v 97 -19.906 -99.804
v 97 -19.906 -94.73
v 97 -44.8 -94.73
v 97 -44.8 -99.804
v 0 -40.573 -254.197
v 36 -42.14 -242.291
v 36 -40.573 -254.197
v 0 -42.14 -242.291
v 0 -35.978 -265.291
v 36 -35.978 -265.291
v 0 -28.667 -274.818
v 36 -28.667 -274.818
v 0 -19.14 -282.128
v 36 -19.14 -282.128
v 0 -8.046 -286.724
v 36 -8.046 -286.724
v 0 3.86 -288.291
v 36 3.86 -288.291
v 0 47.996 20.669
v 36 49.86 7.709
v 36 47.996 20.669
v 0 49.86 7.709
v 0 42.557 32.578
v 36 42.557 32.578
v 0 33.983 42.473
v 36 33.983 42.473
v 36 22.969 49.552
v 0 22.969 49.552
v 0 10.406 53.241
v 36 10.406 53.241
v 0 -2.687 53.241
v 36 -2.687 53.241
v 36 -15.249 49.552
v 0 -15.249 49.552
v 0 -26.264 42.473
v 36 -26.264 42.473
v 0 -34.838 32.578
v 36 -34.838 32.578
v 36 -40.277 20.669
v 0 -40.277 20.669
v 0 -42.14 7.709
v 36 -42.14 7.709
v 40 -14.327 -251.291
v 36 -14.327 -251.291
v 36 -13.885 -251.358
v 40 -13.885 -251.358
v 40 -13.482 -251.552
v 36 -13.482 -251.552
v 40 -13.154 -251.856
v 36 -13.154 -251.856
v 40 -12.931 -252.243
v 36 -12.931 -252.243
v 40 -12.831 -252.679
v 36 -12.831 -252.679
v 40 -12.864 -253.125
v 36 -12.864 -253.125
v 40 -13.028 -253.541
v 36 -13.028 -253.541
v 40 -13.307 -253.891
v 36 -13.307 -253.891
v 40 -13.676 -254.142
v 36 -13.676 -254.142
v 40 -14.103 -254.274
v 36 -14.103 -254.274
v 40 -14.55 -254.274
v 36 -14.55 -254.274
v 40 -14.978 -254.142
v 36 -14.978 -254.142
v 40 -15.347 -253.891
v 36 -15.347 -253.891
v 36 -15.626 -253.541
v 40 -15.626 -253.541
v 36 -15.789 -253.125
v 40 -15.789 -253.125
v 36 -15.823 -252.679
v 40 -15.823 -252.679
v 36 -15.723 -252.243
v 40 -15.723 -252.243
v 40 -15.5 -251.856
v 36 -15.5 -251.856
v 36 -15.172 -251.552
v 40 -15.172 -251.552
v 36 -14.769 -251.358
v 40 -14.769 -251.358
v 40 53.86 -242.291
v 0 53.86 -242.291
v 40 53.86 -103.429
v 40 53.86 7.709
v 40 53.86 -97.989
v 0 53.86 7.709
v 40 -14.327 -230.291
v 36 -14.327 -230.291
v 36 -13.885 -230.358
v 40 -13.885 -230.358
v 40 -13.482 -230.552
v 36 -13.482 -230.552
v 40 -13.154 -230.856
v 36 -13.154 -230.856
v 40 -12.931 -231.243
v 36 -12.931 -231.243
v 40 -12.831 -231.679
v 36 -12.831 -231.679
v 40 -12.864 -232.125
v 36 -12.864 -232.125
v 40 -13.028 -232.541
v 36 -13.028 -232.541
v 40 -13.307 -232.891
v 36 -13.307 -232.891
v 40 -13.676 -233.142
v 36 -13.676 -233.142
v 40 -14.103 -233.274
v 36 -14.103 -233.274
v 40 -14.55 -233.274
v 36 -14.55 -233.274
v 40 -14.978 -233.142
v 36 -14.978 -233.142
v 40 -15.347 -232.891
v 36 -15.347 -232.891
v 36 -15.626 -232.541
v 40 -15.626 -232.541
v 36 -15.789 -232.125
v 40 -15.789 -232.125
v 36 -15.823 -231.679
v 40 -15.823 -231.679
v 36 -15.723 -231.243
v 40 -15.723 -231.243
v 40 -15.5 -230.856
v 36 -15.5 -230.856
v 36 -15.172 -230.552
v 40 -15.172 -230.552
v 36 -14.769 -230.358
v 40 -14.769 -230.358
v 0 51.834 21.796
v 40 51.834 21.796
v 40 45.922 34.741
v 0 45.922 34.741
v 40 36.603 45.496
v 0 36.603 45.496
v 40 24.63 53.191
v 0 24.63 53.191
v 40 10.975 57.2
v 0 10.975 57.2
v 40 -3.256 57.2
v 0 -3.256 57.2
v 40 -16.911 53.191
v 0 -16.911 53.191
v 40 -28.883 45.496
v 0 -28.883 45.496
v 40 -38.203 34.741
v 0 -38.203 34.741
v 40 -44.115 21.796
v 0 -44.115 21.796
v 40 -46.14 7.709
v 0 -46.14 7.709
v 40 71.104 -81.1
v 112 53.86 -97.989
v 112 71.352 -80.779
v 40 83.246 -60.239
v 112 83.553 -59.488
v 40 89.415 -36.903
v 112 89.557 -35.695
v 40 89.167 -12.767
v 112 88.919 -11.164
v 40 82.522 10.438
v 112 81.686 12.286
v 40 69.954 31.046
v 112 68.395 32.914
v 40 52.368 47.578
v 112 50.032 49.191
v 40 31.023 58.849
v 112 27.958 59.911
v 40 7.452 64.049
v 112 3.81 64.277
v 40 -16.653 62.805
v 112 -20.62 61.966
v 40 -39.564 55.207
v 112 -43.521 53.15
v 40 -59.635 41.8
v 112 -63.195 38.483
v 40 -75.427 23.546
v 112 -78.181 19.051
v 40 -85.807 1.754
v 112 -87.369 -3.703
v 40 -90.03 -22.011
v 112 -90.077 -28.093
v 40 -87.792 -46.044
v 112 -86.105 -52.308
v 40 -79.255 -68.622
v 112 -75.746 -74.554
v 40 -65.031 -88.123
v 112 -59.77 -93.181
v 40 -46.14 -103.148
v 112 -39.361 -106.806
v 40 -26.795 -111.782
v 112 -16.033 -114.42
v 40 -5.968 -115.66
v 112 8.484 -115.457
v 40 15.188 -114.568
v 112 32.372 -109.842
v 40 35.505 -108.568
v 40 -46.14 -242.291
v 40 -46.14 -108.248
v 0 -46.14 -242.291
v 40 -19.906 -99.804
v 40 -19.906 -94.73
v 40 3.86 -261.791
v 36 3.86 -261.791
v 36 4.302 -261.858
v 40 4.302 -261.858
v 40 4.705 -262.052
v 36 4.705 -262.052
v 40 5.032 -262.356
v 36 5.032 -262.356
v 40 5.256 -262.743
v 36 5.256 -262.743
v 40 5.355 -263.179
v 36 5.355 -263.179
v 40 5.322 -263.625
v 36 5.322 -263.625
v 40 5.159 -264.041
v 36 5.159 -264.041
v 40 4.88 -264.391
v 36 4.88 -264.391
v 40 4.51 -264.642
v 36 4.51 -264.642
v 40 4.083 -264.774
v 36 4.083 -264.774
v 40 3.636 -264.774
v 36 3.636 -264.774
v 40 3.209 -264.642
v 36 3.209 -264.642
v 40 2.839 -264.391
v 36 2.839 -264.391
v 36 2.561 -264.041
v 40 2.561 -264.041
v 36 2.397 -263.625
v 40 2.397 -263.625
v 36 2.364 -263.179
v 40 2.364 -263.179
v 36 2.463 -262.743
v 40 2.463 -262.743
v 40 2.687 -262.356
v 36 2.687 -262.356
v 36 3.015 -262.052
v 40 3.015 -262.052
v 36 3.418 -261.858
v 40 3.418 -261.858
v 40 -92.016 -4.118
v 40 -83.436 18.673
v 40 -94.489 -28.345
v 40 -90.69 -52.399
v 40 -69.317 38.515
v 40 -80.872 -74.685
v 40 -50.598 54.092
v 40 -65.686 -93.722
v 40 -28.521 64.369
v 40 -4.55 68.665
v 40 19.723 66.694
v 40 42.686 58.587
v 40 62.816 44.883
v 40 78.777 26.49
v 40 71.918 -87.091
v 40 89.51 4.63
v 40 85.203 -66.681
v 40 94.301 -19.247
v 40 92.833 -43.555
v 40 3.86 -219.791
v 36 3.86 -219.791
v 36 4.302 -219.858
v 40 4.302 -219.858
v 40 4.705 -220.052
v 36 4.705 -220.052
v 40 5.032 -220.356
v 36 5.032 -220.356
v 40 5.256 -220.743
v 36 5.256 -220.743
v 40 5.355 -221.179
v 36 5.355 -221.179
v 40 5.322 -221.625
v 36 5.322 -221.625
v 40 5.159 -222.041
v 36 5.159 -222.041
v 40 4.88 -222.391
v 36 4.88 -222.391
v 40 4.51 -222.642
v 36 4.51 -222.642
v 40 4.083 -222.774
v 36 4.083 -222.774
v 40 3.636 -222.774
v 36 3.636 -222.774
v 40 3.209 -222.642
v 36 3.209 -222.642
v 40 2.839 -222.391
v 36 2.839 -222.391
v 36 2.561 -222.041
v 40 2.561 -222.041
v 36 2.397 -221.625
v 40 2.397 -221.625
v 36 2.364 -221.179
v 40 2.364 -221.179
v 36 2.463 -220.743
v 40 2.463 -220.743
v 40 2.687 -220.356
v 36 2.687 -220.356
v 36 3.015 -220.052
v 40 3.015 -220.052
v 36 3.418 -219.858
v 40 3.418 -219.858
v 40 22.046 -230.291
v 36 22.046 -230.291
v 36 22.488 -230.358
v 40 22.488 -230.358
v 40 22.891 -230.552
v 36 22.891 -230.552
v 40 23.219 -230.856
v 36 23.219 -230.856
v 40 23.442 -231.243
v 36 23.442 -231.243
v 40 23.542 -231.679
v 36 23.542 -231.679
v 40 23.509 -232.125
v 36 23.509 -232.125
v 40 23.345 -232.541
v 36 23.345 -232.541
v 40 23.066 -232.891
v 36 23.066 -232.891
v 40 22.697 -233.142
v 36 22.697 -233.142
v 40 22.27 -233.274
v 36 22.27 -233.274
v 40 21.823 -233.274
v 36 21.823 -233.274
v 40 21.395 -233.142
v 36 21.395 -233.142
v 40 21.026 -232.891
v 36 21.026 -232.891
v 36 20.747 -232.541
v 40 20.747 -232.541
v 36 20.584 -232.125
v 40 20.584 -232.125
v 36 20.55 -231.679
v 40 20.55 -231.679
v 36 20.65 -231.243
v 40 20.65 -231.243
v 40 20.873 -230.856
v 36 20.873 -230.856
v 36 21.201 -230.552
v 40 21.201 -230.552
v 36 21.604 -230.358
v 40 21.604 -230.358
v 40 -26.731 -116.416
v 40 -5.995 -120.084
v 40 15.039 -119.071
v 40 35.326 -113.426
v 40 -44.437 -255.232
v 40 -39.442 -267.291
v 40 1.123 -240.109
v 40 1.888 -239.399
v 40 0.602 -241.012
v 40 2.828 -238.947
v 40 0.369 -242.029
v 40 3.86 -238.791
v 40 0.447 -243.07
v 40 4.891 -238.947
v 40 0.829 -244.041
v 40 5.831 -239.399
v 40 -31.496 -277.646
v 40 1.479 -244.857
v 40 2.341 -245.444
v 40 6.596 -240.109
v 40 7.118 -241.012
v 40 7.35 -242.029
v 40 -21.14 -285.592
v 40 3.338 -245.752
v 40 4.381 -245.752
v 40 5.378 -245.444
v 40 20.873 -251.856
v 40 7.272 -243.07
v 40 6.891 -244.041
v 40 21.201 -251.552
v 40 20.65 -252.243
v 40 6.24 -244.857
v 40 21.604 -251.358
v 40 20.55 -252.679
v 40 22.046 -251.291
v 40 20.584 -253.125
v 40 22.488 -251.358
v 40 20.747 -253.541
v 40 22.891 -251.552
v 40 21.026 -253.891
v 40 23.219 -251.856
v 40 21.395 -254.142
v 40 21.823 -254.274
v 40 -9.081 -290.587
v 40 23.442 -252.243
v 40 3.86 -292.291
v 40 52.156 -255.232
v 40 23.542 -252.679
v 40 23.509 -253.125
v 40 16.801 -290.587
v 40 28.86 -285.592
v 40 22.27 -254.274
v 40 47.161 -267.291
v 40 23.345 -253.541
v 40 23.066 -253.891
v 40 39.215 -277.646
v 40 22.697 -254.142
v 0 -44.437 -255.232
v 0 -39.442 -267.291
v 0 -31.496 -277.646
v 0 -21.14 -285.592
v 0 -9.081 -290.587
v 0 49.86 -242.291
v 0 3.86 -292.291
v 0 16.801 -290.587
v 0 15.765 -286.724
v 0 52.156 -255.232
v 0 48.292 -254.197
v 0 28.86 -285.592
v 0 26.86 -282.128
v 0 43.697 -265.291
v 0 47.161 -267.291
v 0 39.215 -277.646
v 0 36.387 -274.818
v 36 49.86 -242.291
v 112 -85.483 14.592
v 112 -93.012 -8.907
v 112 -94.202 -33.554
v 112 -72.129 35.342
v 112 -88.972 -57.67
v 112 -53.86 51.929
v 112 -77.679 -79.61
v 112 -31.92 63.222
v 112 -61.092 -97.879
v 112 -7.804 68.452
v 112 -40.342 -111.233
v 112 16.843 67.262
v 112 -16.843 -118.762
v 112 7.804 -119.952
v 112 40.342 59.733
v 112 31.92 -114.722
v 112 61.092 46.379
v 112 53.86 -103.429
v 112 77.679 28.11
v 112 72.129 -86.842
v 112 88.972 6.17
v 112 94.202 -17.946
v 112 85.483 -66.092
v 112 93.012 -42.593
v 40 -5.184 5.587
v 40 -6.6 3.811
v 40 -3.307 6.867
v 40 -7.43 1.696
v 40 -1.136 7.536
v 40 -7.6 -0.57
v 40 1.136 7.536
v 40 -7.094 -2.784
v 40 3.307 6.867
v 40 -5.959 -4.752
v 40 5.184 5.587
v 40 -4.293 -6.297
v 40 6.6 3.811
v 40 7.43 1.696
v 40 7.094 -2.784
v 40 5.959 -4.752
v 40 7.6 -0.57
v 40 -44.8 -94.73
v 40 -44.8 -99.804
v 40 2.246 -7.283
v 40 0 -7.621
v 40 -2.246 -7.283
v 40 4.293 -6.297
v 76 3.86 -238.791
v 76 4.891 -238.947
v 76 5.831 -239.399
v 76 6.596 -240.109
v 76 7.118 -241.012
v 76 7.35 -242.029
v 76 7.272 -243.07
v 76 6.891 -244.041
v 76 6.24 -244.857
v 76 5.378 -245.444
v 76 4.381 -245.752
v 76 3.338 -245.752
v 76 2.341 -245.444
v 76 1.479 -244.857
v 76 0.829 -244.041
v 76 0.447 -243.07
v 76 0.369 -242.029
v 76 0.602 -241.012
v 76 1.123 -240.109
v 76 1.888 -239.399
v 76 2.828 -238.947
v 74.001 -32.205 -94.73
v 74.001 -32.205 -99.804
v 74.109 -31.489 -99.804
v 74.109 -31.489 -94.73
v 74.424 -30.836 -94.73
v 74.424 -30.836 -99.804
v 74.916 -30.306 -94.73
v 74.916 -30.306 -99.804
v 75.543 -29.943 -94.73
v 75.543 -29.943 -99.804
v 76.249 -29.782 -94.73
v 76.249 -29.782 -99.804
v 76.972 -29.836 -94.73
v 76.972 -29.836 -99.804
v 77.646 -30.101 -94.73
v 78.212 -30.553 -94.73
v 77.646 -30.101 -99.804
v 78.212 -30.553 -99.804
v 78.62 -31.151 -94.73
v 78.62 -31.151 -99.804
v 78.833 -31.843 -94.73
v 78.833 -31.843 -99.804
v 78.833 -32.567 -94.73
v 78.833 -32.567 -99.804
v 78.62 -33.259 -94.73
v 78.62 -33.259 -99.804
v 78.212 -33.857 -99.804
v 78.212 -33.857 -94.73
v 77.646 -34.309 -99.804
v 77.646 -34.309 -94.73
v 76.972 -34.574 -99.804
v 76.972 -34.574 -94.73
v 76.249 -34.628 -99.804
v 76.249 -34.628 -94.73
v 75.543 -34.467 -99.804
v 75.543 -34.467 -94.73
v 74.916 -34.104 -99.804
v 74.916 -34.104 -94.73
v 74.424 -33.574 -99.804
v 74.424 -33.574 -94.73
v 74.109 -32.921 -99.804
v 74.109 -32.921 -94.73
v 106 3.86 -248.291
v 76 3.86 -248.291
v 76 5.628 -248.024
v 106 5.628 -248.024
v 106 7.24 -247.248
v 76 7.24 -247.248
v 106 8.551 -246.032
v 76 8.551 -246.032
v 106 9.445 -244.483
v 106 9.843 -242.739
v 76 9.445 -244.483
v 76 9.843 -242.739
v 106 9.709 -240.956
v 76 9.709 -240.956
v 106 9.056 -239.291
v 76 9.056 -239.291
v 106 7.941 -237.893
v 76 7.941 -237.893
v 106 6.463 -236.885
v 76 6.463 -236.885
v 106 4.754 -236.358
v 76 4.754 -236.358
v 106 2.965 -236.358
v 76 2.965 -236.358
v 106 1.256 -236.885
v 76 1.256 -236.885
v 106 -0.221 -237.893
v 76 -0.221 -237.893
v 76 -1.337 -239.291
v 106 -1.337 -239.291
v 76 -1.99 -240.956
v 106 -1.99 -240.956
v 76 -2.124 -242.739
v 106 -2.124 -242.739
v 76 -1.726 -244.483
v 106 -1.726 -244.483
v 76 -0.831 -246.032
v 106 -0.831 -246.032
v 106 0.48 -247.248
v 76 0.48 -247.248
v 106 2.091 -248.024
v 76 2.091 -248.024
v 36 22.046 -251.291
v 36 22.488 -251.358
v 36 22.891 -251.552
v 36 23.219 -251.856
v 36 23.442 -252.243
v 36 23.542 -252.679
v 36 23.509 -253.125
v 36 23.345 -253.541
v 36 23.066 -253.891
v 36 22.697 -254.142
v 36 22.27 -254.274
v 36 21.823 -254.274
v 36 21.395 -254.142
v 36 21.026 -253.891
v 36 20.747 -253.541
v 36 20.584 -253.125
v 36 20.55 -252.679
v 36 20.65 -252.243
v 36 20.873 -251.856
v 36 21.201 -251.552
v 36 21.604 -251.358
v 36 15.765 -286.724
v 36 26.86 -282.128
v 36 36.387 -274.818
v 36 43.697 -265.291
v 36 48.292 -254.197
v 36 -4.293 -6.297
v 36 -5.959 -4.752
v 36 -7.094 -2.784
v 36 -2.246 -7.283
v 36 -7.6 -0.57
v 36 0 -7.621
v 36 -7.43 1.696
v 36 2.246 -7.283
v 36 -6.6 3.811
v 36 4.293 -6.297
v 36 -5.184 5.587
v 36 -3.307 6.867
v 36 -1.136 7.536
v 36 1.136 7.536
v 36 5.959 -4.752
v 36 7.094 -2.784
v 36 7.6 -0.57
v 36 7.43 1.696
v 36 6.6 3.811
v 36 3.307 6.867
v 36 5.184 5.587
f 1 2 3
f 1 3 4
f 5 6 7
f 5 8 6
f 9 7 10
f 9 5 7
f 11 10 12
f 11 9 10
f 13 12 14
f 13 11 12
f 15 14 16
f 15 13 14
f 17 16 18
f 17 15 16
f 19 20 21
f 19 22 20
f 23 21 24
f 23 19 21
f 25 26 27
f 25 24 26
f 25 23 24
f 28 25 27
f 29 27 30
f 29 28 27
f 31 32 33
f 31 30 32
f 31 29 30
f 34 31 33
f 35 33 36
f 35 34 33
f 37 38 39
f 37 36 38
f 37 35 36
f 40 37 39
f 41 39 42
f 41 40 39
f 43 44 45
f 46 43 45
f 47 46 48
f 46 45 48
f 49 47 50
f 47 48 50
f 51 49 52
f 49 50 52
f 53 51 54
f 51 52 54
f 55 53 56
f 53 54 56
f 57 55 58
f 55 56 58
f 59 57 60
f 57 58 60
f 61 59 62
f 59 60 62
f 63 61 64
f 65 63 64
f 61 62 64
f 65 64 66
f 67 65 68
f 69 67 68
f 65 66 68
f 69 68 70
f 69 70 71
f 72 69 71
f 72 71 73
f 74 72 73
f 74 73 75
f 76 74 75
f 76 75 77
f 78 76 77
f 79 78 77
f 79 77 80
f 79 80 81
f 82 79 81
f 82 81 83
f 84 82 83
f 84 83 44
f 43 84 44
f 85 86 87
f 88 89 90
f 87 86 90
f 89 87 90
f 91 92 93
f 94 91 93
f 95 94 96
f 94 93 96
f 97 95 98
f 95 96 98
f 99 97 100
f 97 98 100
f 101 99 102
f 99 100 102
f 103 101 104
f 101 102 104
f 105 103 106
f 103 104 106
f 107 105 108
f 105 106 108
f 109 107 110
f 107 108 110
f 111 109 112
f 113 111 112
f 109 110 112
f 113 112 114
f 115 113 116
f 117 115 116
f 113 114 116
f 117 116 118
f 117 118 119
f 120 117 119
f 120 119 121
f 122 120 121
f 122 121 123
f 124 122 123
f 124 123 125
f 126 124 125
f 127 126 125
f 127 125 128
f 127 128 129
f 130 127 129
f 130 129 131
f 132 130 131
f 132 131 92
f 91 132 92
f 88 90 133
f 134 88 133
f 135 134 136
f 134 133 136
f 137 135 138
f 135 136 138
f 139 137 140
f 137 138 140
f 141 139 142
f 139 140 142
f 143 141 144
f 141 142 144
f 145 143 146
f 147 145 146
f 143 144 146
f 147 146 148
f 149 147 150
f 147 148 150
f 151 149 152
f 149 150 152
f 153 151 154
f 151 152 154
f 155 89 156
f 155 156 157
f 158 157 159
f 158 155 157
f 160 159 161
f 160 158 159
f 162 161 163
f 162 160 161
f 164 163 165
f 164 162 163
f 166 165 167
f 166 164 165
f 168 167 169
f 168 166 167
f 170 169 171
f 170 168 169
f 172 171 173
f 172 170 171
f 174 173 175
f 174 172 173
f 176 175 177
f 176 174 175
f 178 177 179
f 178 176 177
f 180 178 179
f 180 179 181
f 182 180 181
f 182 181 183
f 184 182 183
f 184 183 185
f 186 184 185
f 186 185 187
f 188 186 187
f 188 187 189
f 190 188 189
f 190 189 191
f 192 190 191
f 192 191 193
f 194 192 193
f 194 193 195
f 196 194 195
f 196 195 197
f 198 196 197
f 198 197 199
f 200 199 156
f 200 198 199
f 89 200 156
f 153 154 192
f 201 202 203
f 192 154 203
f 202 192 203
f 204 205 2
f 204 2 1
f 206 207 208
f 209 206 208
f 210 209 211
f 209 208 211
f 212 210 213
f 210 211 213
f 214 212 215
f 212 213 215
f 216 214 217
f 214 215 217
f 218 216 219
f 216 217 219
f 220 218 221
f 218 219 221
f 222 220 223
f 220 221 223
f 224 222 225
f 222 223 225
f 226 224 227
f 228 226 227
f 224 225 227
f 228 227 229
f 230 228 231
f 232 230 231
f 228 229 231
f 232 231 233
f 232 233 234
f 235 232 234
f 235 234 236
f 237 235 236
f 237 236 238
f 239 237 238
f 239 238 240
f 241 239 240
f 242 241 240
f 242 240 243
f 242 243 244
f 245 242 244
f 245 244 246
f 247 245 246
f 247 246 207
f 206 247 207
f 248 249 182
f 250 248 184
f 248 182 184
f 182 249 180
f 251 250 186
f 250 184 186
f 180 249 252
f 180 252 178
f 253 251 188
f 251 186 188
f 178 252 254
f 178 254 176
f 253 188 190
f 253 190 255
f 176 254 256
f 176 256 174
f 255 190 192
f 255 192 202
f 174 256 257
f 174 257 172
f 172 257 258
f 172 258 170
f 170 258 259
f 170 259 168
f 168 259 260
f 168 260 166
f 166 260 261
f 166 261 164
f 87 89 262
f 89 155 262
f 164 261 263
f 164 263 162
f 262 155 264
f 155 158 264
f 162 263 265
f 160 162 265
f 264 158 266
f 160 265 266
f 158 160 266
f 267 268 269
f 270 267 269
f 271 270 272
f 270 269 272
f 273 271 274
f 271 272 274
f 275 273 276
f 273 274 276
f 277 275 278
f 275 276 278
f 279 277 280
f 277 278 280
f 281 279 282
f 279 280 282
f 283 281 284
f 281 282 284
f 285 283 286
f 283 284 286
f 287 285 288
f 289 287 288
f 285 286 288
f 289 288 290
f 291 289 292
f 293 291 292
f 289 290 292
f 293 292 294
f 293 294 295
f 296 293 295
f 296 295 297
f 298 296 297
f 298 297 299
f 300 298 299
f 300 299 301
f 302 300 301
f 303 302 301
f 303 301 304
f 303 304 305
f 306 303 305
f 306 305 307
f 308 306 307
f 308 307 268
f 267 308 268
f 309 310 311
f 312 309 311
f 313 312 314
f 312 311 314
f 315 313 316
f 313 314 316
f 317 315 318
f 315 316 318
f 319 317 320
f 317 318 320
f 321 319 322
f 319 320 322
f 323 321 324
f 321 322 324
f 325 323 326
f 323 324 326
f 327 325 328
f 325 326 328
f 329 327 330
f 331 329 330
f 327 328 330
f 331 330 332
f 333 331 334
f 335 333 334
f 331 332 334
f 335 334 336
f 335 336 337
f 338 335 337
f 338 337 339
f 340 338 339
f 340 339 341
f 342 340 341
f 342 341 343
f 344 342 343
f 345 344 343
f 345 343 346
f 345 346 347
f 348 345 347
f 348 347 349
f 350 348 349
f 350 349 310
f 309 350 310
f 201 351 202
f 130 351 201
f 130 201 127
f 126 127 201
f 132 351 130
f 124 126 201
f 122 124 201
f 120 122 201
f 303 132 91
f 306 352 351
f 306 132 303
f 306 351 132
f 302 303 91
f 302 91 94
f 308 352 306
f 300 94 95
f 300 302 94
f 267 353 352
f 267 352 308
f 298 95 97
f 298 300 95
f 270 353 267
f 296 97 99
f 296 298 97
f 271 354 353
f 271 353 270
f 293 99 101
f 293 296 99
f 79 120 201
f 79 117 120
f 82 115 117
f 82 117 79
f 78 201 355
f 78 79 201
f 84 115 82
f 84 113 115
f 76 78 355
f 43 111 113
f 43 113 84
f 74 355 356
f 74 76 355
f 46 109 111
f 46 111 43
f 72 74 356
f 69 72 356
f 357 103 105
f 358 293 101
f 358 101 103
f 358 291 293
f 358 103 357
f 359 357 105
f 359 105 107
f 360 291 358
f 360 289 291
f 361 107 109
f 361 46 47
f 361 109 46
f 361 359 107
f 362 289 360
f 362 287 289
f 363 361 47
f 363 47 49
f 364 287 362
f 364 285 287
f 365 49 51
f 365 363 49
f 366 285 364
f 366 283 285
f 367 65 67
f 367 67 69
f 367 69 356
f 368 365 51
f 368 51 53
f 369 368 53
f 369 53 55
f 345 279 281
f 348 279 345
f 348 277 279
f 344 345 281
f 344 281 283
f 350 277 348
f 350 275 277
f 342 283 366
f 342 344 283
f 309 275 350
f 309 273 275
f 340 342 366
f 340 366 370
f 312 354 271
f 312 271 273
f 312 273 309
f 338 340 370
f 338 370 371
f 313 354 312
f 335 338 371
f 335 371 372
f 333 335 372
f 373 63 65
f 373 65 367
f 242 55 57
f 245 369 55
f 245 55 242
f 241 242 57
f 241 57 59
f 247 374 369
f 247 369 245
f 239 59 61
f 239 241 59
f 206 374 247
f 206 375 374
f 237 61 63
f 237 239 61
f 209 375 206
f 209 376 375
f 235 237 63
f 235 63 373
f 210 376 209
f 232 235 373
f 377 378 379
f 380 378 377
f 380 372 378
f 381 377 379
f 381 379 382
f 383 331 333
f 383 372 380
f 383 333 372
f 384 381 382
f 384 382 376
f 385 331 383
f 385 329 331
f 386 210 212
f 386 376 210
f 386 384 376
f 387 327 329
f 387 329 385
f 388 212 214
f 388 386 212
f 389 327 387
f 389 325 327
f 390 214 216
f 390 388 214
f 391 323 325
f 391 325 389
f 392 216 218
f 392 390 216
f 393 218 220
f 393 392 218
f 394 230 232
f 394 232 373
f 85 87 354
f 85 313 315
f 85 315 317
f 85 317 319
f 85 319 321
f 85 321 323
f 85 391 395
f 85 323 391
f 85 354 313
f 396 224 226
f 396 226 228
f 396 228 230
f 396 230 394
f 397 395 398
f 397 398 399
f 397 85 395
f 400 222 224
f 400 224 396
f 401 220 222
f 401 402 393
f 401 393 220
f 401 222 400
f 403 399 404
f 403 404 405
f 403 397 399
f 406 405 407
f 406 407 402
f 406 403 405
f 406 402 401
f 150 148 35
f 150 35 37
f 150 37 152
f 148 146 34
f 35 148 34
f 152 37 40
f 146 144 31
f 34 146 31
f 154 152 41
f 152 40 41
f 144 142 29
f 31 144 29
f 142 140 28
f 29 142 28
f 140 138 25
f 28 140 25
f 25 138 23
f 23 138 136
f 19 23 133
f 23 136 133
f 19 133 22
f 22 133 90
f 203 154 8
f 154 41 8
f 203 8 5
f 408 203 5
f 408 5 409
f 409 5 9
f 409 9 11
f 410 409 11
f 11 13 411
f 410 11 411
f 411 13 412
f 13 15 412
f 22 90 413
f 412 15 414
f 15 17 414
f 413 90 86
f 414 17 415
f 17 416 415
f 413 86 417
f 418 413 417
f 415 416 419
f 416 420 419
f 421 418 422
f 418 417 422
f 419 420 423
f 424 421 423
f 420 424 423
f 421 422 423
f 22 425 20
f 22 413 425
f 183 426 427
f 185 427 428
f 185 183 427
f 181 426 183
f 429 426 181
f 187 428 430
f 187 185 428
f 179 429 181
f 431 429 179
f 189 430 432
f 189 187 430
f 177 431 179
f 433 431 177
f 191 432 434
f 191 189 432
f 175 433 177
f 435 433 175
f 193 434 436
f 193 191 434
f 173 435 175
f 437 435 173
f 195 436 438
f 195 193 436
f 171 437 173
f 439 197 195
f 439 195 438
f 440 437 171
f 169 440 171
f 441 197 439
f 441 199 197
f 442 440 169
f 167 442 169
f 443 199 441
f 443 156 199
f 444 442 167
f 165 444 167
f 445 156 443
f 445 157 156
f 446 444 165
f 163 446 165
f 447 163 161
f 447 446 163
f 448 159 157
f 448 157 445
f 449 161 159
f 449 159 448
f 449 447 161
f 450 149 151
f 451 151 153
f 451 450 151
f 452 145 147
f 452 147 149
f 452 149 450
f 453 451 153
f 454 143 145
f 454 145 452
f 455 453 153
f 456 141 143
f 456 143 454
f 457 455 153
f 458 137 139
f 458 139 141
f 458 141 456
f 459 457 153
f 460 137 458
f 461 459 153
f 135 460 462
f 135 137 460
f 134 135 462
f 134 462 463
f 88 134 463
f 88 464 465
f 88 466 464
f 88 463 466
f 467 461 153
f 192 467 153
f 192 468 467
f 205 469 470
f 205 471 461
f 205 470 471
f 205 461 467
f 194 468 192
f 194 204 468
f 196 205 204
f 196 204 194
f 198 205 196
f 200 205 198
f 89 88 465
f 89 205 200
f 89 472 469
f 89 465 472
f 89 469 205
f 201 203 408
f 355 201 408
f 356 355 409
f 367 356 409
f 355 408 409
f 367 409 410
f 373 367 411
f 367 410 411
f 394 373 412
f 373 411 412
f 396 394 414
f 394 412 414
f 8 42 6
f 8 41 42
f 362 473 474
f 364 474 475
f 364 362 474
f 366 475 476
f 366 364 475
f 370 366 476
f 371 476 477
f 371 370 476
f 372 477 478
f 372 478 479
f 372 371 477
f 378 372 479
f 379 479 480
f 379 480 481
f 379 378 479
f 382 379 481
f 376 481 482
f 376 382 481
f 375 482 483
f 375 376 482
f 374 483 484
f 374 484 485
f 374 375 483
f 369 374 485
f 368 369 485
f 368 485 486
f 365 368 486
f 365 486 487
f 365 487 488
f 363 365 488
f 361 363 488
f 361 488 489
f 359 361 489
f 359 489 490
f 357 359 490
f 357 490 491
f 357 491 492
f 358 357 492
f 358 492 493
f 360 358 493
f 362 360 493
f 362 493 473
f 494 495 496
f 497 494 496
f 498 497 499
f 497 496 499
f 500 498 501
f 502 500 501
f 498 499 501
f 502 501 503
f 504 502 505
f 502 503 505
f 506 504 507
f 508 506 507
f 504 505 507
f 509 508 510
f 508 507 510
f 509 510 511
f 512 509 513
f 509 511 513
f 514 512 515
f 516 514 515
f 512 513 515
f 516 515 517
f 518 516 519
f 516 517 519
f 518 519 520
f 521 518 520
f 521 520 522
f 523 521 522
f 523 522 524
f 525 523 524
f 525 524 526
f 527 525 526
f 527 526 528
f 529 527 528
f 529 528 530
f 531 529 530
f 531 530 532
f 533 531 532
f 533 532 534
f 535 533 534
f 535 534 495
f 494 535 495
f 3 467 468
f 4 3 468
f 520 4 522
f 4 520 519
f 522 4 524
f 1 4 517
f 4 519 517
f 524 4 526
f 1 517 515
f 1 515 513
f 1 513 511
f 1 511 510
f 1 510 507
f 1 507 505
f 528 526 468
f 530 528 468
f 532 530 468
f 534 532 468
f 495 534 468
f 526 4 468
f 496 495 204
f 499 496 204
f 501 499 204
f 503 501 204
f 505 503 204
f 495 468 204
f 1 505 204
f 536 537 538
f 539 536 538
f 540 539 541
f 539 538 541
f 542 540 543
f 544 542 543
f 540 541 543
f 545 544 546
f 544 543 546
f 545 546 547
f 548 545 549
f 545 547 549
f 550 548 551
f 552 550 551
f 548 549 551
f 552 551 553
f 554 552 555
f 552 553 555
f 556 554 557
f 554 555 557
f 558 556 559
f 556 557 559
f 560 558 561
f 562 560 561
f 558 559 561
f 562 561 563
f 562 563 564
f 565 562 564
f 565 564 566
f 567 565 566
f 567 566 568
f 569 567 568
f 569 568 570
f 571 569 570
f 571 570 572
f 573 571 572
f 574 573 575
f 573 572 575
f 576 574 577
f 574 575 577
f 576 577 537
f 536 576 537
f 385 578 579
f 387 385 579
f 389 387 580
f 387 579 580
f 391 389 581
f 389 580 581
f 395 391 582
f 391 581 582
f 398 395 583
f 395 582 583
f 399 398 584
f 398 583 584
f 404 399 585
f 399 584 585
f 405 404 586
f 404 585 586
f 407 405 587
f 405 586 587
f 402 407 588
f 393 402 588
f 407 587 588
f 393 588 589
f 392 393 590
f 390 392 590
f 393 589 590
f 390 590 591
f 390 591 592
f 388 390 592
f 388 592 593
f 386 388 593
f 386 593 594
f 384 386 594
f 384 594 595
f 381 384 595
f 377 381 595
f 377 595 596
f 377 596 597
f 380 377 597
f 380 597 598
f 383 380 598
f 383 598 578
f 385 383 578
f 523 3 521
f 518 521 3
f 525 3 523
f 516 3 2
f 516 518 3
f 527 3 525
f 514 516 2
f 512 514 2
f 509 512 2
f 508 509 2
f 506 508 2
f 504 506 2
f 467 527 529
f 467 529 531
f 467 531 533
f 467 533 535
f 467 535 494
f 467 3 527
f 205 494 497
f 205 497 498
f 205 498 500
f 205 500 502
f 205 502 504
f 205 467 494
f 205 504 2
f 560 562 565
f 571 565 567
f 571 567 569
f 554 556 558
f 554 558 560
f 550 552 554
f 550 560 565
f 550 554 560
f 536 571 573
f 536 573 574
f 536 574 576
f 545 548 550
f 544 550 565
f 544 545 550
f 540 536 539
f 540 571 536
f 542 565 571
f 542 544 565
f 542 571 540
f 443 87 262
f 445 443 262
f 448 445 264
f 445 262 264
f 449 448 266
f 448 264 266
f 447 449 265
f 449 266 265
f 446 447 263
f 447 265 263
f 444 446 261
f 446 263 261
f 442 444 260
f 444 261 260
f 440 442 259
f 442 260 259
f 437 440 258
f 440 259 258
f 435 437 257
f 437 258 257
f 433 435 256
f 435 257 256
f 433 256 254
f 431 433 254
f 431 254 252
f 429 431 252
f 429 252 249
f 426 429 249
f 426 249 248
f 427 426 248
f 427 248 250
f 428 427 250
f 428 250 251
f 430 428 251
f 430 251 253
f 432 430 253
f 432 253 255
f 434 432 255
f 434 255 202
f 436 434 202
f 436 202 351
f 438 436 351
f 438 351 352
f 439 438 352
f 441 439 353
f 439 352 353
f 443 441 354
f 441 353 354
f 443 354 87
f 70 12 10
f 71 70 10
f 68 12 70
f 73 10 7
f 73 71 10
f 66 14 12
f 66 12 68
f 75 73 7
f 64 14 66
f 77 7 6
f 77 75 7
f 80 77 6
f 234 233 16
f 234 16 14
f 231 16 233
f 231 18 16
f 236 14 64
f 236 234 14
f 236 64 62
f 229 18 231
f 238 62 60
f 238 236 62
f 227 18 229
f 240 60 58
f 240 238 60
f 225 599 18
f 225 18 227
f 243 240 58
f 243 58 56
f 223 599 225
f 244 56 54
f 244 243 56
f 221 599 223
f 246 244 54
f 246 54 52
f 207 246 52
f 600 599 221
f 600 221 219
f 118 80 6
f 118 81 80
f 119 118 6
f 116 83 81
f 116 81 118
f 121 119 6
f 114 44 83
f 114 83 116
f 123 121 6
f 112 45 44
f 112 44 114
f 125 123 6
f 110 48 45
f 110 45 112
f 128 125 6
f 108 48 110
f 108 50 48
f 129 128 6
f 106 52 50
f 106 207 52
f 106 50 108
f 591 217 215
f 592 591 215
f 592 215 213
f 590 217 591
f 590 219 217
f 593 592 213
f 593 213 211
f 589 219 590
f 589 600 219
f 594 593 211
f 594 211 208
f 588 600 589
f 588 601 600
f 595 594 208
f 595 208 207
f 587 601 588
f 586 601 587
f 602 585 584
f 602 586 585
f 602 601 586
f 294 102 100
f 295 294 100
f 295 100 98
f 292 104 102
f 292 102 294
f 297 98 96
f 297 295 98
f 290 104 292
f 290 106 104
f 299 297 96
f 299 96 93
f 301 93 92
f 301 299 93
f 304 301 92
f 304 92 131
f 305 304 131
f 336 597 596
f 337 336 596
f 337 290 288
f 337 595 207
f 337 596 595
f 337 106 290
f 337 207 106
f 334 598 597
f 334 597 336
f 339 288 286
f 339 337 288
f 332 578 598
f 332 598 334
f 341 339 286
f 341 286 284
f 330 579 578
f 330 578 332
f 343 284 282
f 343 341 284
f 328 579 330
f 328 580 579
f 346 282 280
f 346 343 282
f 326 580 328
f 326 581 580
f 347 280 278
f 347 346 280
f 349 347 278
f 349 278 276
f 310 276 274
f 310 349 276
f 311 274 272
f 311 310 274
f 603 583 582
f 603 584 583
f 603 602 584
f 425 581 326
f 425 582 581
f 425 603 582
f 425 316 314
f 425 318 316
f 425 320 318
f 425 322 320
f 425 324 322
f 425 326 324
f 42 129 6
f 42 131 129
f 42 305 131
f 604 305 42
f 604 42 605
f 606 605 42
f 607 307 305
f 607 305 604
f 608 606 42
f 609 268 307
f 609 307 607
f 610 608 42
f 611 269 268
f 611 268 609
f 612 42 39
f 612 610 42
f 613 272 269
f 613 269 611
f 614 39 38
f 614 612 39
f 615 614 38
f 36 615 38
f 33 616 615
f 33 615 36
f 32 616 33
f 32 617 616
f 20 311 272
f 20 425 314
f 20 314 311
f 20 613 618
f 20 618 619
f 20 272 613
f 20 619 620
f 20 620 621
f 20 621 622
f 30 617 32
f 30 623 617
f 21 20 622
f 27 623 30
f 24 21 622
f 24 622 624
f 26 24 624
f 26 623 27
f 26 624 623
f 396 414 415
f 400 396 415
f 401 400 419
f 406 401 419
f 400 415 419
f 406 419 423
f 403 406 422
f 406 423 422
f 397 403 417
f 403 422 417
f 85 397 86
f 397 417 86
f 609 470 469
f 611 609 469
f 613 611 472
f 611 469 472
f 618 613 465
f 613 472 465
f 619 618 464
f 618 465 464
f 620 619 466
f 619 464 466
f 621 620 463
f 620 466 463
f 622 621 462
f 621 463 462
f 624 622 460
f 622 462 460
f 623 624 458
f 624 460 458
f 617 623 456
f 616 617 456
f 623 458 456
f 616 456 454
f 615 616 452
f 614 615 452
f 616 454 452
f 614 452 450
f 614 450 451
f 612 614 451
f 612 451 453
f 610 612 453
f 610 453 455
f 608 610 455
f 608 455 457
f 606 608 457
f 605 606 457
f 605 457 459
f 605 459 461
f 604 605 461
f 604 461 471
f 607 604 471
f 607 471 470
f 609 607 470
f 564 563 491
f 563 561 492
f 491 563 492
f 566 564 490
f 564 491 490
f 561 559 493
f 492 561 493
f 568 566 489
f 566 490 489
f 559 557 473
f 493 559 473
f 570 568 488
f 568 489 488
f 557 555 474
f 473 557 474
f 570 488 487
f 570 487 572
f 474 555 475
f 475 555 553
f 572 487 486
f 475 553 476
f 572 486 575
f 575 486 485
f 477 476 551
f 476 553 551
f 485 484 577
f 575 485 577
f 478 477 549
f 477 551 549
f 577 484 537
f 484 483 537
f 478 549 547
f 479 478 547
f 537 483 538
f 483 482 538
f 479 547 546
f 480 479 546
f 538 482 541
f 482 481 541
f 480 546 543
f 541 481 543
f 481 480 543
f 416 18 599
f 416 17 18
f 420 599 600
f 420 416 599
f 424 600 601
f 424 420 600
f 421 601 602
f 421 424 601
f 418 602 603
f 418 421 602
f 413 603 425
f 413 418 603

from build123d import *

# Parameters (mm, degrees)
BOSS_EXTRUDE1_DEPTH = 40
SHELL1_T            = -4
SKETCH4_R           = 1.5
CUT_EXTRUDE1_DEPTH  = 40
SKETCH6_R           = 3.5
BOSS_EXTRUDE2_DEPTH = 40
SKETCH7_R           = 6
BOSS_EXTRUDE3_DEPTH = 30
SKETCH11_R          = 7.621273112
CUT_EXTRUDE2_DEPTH  = 10
SKETCH14_W          = 5.073937662
SKETCH14_H          = 24.893505848
BOSS_EXTRUDE5_DEPTH = 57
SKETCH15_R          = 2.42948244
CUT_EXTRUDE4_DEPTH  = 57
SKETCH18_R          = 94.524667443
SKETCH18_R_2        = 90.107612794
BOSS_EXTRUDE7_DEPTH = 72


with BuildPart() as part:
    # Sketch2 → Boss-Extrude1 (new body)
    with BuildSketch(Plane(origin=(0, 0, 0), x_dir=(0, 0, -1), z_dir=(1, 0, 0))):
        with BuildLine():
            ThreePointArc((42.291021672, 3.859649123), (27.646360731, -31.495689937), (-7.708978328, -46.140350877))
            Line((-7.708978328, -46.140350877), (242.291021672, -46.140350877))
            ThreePointArc((242.291021672, -46.140350877), (192.291021672, 3.859649123), (242.291021672, 53.859649123))
            Line((242.291021672, 53.859649123), (-7.708978328, 53.859649123))
            ThreePointArc((-7.708978328, 53.859649123), (27.646360731, 39.214988182), (42.291021672, 3.859649123))
        make_face()
        with BuildLine():
            ThreePointArc((-7.708978328, 53.859649123), (-57.708978328, 3.859649123), (-7.708978328, -46.140350877))
            Line((-7.708978328, -46.140350877), (-7.708978328, 53.859649123))
        make_face()
        with BuildLine():
            Line((-7.708978328, 53.859649123), (-7.708978328, -46.140350877))
            ThreePointArc((-7.708978328, -46.140350877), (27.646360731, -31.495689937), (42.291021672, 3.859649123))
            ThreePointArc((42.291021672, 3.859649123), (27.646360731, 39.214988182), (-7.708978328, 53.859649123))
        make_face()
        with BuildLine():
            ThreePointArc((242.291021672, 53.859649123), (192.291021672, 3.859649123), (242.291021672, -46.140350877))
            Line((242.291021672, -46.140350877), (242.291021672, 53.859649123))
        make_face()
        with BuildLine():
            Line((242.291021672, 53.859649123), (242.291021672, -46.140350877))
            ThreePointArc((242.291021672, -46.140350877), (277.646360731, -31.495689937), (292.291021672, 3.859649123))
            ThreePointArc((292.291021672, 3.859649123), (277.646360731, 39.214988182), (242.291021672, 53.859649123))
        make_face()
    extrude(amount=BOSS_EXTRUDE1_DEPTH)

    # Shell1
    shell1_openings = [part.faces().sort_by_distance(p)[0] for p in [
        (0, 3.859649123, -117.291021672),
    ]]
    offset(amount=SHELL1_T, openings=shell1_openings, kind=Kind.INTERSECTION)

    # Sketch4 → Cut-Extrude1 (cut)
    with BuildSketch(Plane.ZY.offset(-36)):
        with Locations((-252.791021672, 22.046182602)):
            Circle(SKETCH4_R)
        with Locations((-231.791021672, 22.046182602)):
            Circle(SKETCH4_R)
        with Locations((-263.291021672, 3.859649123)):
            Circle(SKETCH4_R)
        with Locations((-221.291021672, 3.859649123)):
            Circle(SKETCH4_R)
        with Locations((-252.791021672, -14.326884357)):
            Circle(SKETCH4_R)
        with Locations((-231.791021672, -14.326884357)):
            Circle(SKETCH4_R)
    extrude(amount=-CUT_EXTRUDE1_DEPTH, mode=Mode.SUBTRACT)

    # Sketch6 → Boss-Extrude2 (add)
    with BuildSketch(Plane.ZY.offset(-36)):
        with Locations((-242.291021672, 3.859649123)):
            Circle(SKETCH6_R)
    extrude(amount=-BOSS_EXTRUDE2_DEPTH)

    # Sketch7 → Boss-Extrude3 (add)
    with BuildSketch(Plane(origin=(76, 0, 0), x_dir=(0, 0, -1), z_dir=(1, 0, 0))):
        with Locations((242.291021672, 3.859649123)):
            Circle(SKETCH7_R)
    extrude(amount=BOSS_EXTRUDE3_DEPTH)

    # Sketch11 → Cut-Extrude2 (cut)
    with BuildSketch(Plane(origin=(40, 0, 0), x_dir=(0, 0, -1), z_dir=(1, 0, 0))):
        Circle(SKETCH11_R)
    extrude(amount=-CUT_EXTRUDE2_DEPTH, mode=Mode.SUBTRACT)

    # Sketch14 → Boss-Extrude5 (add)
    with BuildSketch(Plane(origin=(40, 0, 0), x_dir=(0, 0, -1), z_dir=(1, 0, 0))):
        with Locations((97.267454621, -32.353135016)):
            Rectangle(SKETCH14_W, SKETCH14_H)
    extrude(amount=BOSS_EXTRUDE5_DEPTH)

    # Sketch15 → Cut-Extrude4 (cut)
    with BuildSketch(Plane(origin=(0, 0, -99.804423452), x_dir=(-1, 0, 0), z_dir=(0, 0, -1))):
        with Locations((-76.430932939, -32.204980858)):
            Circle(SKETCH15_R)
    extrude(amount=-CUT_EXTRUDE4_DEPTH, mode=Mode.SUBTRACT)

    # Sketch18 → Boss-Extrude7 (add)
    with BuildSketch(Plane(origin=(40, 0, 0), x_dir=(0, 0, -1), z_dir=(1, 0, 0))):
        with Locations(Location((25.75, 0, 0), (0, 0, 34.735906814))):
            Circle(SKETCH18_R)
        with Locations(Location((25.75, 0, 0), (0, 0, 36.707196429))):
            Circle(SKETCH18_R_2, mode=Mode.SUBTRACT)
    extrude(amount=BOSS_EXTRUDE7_DEPTH)


solid = part.part
